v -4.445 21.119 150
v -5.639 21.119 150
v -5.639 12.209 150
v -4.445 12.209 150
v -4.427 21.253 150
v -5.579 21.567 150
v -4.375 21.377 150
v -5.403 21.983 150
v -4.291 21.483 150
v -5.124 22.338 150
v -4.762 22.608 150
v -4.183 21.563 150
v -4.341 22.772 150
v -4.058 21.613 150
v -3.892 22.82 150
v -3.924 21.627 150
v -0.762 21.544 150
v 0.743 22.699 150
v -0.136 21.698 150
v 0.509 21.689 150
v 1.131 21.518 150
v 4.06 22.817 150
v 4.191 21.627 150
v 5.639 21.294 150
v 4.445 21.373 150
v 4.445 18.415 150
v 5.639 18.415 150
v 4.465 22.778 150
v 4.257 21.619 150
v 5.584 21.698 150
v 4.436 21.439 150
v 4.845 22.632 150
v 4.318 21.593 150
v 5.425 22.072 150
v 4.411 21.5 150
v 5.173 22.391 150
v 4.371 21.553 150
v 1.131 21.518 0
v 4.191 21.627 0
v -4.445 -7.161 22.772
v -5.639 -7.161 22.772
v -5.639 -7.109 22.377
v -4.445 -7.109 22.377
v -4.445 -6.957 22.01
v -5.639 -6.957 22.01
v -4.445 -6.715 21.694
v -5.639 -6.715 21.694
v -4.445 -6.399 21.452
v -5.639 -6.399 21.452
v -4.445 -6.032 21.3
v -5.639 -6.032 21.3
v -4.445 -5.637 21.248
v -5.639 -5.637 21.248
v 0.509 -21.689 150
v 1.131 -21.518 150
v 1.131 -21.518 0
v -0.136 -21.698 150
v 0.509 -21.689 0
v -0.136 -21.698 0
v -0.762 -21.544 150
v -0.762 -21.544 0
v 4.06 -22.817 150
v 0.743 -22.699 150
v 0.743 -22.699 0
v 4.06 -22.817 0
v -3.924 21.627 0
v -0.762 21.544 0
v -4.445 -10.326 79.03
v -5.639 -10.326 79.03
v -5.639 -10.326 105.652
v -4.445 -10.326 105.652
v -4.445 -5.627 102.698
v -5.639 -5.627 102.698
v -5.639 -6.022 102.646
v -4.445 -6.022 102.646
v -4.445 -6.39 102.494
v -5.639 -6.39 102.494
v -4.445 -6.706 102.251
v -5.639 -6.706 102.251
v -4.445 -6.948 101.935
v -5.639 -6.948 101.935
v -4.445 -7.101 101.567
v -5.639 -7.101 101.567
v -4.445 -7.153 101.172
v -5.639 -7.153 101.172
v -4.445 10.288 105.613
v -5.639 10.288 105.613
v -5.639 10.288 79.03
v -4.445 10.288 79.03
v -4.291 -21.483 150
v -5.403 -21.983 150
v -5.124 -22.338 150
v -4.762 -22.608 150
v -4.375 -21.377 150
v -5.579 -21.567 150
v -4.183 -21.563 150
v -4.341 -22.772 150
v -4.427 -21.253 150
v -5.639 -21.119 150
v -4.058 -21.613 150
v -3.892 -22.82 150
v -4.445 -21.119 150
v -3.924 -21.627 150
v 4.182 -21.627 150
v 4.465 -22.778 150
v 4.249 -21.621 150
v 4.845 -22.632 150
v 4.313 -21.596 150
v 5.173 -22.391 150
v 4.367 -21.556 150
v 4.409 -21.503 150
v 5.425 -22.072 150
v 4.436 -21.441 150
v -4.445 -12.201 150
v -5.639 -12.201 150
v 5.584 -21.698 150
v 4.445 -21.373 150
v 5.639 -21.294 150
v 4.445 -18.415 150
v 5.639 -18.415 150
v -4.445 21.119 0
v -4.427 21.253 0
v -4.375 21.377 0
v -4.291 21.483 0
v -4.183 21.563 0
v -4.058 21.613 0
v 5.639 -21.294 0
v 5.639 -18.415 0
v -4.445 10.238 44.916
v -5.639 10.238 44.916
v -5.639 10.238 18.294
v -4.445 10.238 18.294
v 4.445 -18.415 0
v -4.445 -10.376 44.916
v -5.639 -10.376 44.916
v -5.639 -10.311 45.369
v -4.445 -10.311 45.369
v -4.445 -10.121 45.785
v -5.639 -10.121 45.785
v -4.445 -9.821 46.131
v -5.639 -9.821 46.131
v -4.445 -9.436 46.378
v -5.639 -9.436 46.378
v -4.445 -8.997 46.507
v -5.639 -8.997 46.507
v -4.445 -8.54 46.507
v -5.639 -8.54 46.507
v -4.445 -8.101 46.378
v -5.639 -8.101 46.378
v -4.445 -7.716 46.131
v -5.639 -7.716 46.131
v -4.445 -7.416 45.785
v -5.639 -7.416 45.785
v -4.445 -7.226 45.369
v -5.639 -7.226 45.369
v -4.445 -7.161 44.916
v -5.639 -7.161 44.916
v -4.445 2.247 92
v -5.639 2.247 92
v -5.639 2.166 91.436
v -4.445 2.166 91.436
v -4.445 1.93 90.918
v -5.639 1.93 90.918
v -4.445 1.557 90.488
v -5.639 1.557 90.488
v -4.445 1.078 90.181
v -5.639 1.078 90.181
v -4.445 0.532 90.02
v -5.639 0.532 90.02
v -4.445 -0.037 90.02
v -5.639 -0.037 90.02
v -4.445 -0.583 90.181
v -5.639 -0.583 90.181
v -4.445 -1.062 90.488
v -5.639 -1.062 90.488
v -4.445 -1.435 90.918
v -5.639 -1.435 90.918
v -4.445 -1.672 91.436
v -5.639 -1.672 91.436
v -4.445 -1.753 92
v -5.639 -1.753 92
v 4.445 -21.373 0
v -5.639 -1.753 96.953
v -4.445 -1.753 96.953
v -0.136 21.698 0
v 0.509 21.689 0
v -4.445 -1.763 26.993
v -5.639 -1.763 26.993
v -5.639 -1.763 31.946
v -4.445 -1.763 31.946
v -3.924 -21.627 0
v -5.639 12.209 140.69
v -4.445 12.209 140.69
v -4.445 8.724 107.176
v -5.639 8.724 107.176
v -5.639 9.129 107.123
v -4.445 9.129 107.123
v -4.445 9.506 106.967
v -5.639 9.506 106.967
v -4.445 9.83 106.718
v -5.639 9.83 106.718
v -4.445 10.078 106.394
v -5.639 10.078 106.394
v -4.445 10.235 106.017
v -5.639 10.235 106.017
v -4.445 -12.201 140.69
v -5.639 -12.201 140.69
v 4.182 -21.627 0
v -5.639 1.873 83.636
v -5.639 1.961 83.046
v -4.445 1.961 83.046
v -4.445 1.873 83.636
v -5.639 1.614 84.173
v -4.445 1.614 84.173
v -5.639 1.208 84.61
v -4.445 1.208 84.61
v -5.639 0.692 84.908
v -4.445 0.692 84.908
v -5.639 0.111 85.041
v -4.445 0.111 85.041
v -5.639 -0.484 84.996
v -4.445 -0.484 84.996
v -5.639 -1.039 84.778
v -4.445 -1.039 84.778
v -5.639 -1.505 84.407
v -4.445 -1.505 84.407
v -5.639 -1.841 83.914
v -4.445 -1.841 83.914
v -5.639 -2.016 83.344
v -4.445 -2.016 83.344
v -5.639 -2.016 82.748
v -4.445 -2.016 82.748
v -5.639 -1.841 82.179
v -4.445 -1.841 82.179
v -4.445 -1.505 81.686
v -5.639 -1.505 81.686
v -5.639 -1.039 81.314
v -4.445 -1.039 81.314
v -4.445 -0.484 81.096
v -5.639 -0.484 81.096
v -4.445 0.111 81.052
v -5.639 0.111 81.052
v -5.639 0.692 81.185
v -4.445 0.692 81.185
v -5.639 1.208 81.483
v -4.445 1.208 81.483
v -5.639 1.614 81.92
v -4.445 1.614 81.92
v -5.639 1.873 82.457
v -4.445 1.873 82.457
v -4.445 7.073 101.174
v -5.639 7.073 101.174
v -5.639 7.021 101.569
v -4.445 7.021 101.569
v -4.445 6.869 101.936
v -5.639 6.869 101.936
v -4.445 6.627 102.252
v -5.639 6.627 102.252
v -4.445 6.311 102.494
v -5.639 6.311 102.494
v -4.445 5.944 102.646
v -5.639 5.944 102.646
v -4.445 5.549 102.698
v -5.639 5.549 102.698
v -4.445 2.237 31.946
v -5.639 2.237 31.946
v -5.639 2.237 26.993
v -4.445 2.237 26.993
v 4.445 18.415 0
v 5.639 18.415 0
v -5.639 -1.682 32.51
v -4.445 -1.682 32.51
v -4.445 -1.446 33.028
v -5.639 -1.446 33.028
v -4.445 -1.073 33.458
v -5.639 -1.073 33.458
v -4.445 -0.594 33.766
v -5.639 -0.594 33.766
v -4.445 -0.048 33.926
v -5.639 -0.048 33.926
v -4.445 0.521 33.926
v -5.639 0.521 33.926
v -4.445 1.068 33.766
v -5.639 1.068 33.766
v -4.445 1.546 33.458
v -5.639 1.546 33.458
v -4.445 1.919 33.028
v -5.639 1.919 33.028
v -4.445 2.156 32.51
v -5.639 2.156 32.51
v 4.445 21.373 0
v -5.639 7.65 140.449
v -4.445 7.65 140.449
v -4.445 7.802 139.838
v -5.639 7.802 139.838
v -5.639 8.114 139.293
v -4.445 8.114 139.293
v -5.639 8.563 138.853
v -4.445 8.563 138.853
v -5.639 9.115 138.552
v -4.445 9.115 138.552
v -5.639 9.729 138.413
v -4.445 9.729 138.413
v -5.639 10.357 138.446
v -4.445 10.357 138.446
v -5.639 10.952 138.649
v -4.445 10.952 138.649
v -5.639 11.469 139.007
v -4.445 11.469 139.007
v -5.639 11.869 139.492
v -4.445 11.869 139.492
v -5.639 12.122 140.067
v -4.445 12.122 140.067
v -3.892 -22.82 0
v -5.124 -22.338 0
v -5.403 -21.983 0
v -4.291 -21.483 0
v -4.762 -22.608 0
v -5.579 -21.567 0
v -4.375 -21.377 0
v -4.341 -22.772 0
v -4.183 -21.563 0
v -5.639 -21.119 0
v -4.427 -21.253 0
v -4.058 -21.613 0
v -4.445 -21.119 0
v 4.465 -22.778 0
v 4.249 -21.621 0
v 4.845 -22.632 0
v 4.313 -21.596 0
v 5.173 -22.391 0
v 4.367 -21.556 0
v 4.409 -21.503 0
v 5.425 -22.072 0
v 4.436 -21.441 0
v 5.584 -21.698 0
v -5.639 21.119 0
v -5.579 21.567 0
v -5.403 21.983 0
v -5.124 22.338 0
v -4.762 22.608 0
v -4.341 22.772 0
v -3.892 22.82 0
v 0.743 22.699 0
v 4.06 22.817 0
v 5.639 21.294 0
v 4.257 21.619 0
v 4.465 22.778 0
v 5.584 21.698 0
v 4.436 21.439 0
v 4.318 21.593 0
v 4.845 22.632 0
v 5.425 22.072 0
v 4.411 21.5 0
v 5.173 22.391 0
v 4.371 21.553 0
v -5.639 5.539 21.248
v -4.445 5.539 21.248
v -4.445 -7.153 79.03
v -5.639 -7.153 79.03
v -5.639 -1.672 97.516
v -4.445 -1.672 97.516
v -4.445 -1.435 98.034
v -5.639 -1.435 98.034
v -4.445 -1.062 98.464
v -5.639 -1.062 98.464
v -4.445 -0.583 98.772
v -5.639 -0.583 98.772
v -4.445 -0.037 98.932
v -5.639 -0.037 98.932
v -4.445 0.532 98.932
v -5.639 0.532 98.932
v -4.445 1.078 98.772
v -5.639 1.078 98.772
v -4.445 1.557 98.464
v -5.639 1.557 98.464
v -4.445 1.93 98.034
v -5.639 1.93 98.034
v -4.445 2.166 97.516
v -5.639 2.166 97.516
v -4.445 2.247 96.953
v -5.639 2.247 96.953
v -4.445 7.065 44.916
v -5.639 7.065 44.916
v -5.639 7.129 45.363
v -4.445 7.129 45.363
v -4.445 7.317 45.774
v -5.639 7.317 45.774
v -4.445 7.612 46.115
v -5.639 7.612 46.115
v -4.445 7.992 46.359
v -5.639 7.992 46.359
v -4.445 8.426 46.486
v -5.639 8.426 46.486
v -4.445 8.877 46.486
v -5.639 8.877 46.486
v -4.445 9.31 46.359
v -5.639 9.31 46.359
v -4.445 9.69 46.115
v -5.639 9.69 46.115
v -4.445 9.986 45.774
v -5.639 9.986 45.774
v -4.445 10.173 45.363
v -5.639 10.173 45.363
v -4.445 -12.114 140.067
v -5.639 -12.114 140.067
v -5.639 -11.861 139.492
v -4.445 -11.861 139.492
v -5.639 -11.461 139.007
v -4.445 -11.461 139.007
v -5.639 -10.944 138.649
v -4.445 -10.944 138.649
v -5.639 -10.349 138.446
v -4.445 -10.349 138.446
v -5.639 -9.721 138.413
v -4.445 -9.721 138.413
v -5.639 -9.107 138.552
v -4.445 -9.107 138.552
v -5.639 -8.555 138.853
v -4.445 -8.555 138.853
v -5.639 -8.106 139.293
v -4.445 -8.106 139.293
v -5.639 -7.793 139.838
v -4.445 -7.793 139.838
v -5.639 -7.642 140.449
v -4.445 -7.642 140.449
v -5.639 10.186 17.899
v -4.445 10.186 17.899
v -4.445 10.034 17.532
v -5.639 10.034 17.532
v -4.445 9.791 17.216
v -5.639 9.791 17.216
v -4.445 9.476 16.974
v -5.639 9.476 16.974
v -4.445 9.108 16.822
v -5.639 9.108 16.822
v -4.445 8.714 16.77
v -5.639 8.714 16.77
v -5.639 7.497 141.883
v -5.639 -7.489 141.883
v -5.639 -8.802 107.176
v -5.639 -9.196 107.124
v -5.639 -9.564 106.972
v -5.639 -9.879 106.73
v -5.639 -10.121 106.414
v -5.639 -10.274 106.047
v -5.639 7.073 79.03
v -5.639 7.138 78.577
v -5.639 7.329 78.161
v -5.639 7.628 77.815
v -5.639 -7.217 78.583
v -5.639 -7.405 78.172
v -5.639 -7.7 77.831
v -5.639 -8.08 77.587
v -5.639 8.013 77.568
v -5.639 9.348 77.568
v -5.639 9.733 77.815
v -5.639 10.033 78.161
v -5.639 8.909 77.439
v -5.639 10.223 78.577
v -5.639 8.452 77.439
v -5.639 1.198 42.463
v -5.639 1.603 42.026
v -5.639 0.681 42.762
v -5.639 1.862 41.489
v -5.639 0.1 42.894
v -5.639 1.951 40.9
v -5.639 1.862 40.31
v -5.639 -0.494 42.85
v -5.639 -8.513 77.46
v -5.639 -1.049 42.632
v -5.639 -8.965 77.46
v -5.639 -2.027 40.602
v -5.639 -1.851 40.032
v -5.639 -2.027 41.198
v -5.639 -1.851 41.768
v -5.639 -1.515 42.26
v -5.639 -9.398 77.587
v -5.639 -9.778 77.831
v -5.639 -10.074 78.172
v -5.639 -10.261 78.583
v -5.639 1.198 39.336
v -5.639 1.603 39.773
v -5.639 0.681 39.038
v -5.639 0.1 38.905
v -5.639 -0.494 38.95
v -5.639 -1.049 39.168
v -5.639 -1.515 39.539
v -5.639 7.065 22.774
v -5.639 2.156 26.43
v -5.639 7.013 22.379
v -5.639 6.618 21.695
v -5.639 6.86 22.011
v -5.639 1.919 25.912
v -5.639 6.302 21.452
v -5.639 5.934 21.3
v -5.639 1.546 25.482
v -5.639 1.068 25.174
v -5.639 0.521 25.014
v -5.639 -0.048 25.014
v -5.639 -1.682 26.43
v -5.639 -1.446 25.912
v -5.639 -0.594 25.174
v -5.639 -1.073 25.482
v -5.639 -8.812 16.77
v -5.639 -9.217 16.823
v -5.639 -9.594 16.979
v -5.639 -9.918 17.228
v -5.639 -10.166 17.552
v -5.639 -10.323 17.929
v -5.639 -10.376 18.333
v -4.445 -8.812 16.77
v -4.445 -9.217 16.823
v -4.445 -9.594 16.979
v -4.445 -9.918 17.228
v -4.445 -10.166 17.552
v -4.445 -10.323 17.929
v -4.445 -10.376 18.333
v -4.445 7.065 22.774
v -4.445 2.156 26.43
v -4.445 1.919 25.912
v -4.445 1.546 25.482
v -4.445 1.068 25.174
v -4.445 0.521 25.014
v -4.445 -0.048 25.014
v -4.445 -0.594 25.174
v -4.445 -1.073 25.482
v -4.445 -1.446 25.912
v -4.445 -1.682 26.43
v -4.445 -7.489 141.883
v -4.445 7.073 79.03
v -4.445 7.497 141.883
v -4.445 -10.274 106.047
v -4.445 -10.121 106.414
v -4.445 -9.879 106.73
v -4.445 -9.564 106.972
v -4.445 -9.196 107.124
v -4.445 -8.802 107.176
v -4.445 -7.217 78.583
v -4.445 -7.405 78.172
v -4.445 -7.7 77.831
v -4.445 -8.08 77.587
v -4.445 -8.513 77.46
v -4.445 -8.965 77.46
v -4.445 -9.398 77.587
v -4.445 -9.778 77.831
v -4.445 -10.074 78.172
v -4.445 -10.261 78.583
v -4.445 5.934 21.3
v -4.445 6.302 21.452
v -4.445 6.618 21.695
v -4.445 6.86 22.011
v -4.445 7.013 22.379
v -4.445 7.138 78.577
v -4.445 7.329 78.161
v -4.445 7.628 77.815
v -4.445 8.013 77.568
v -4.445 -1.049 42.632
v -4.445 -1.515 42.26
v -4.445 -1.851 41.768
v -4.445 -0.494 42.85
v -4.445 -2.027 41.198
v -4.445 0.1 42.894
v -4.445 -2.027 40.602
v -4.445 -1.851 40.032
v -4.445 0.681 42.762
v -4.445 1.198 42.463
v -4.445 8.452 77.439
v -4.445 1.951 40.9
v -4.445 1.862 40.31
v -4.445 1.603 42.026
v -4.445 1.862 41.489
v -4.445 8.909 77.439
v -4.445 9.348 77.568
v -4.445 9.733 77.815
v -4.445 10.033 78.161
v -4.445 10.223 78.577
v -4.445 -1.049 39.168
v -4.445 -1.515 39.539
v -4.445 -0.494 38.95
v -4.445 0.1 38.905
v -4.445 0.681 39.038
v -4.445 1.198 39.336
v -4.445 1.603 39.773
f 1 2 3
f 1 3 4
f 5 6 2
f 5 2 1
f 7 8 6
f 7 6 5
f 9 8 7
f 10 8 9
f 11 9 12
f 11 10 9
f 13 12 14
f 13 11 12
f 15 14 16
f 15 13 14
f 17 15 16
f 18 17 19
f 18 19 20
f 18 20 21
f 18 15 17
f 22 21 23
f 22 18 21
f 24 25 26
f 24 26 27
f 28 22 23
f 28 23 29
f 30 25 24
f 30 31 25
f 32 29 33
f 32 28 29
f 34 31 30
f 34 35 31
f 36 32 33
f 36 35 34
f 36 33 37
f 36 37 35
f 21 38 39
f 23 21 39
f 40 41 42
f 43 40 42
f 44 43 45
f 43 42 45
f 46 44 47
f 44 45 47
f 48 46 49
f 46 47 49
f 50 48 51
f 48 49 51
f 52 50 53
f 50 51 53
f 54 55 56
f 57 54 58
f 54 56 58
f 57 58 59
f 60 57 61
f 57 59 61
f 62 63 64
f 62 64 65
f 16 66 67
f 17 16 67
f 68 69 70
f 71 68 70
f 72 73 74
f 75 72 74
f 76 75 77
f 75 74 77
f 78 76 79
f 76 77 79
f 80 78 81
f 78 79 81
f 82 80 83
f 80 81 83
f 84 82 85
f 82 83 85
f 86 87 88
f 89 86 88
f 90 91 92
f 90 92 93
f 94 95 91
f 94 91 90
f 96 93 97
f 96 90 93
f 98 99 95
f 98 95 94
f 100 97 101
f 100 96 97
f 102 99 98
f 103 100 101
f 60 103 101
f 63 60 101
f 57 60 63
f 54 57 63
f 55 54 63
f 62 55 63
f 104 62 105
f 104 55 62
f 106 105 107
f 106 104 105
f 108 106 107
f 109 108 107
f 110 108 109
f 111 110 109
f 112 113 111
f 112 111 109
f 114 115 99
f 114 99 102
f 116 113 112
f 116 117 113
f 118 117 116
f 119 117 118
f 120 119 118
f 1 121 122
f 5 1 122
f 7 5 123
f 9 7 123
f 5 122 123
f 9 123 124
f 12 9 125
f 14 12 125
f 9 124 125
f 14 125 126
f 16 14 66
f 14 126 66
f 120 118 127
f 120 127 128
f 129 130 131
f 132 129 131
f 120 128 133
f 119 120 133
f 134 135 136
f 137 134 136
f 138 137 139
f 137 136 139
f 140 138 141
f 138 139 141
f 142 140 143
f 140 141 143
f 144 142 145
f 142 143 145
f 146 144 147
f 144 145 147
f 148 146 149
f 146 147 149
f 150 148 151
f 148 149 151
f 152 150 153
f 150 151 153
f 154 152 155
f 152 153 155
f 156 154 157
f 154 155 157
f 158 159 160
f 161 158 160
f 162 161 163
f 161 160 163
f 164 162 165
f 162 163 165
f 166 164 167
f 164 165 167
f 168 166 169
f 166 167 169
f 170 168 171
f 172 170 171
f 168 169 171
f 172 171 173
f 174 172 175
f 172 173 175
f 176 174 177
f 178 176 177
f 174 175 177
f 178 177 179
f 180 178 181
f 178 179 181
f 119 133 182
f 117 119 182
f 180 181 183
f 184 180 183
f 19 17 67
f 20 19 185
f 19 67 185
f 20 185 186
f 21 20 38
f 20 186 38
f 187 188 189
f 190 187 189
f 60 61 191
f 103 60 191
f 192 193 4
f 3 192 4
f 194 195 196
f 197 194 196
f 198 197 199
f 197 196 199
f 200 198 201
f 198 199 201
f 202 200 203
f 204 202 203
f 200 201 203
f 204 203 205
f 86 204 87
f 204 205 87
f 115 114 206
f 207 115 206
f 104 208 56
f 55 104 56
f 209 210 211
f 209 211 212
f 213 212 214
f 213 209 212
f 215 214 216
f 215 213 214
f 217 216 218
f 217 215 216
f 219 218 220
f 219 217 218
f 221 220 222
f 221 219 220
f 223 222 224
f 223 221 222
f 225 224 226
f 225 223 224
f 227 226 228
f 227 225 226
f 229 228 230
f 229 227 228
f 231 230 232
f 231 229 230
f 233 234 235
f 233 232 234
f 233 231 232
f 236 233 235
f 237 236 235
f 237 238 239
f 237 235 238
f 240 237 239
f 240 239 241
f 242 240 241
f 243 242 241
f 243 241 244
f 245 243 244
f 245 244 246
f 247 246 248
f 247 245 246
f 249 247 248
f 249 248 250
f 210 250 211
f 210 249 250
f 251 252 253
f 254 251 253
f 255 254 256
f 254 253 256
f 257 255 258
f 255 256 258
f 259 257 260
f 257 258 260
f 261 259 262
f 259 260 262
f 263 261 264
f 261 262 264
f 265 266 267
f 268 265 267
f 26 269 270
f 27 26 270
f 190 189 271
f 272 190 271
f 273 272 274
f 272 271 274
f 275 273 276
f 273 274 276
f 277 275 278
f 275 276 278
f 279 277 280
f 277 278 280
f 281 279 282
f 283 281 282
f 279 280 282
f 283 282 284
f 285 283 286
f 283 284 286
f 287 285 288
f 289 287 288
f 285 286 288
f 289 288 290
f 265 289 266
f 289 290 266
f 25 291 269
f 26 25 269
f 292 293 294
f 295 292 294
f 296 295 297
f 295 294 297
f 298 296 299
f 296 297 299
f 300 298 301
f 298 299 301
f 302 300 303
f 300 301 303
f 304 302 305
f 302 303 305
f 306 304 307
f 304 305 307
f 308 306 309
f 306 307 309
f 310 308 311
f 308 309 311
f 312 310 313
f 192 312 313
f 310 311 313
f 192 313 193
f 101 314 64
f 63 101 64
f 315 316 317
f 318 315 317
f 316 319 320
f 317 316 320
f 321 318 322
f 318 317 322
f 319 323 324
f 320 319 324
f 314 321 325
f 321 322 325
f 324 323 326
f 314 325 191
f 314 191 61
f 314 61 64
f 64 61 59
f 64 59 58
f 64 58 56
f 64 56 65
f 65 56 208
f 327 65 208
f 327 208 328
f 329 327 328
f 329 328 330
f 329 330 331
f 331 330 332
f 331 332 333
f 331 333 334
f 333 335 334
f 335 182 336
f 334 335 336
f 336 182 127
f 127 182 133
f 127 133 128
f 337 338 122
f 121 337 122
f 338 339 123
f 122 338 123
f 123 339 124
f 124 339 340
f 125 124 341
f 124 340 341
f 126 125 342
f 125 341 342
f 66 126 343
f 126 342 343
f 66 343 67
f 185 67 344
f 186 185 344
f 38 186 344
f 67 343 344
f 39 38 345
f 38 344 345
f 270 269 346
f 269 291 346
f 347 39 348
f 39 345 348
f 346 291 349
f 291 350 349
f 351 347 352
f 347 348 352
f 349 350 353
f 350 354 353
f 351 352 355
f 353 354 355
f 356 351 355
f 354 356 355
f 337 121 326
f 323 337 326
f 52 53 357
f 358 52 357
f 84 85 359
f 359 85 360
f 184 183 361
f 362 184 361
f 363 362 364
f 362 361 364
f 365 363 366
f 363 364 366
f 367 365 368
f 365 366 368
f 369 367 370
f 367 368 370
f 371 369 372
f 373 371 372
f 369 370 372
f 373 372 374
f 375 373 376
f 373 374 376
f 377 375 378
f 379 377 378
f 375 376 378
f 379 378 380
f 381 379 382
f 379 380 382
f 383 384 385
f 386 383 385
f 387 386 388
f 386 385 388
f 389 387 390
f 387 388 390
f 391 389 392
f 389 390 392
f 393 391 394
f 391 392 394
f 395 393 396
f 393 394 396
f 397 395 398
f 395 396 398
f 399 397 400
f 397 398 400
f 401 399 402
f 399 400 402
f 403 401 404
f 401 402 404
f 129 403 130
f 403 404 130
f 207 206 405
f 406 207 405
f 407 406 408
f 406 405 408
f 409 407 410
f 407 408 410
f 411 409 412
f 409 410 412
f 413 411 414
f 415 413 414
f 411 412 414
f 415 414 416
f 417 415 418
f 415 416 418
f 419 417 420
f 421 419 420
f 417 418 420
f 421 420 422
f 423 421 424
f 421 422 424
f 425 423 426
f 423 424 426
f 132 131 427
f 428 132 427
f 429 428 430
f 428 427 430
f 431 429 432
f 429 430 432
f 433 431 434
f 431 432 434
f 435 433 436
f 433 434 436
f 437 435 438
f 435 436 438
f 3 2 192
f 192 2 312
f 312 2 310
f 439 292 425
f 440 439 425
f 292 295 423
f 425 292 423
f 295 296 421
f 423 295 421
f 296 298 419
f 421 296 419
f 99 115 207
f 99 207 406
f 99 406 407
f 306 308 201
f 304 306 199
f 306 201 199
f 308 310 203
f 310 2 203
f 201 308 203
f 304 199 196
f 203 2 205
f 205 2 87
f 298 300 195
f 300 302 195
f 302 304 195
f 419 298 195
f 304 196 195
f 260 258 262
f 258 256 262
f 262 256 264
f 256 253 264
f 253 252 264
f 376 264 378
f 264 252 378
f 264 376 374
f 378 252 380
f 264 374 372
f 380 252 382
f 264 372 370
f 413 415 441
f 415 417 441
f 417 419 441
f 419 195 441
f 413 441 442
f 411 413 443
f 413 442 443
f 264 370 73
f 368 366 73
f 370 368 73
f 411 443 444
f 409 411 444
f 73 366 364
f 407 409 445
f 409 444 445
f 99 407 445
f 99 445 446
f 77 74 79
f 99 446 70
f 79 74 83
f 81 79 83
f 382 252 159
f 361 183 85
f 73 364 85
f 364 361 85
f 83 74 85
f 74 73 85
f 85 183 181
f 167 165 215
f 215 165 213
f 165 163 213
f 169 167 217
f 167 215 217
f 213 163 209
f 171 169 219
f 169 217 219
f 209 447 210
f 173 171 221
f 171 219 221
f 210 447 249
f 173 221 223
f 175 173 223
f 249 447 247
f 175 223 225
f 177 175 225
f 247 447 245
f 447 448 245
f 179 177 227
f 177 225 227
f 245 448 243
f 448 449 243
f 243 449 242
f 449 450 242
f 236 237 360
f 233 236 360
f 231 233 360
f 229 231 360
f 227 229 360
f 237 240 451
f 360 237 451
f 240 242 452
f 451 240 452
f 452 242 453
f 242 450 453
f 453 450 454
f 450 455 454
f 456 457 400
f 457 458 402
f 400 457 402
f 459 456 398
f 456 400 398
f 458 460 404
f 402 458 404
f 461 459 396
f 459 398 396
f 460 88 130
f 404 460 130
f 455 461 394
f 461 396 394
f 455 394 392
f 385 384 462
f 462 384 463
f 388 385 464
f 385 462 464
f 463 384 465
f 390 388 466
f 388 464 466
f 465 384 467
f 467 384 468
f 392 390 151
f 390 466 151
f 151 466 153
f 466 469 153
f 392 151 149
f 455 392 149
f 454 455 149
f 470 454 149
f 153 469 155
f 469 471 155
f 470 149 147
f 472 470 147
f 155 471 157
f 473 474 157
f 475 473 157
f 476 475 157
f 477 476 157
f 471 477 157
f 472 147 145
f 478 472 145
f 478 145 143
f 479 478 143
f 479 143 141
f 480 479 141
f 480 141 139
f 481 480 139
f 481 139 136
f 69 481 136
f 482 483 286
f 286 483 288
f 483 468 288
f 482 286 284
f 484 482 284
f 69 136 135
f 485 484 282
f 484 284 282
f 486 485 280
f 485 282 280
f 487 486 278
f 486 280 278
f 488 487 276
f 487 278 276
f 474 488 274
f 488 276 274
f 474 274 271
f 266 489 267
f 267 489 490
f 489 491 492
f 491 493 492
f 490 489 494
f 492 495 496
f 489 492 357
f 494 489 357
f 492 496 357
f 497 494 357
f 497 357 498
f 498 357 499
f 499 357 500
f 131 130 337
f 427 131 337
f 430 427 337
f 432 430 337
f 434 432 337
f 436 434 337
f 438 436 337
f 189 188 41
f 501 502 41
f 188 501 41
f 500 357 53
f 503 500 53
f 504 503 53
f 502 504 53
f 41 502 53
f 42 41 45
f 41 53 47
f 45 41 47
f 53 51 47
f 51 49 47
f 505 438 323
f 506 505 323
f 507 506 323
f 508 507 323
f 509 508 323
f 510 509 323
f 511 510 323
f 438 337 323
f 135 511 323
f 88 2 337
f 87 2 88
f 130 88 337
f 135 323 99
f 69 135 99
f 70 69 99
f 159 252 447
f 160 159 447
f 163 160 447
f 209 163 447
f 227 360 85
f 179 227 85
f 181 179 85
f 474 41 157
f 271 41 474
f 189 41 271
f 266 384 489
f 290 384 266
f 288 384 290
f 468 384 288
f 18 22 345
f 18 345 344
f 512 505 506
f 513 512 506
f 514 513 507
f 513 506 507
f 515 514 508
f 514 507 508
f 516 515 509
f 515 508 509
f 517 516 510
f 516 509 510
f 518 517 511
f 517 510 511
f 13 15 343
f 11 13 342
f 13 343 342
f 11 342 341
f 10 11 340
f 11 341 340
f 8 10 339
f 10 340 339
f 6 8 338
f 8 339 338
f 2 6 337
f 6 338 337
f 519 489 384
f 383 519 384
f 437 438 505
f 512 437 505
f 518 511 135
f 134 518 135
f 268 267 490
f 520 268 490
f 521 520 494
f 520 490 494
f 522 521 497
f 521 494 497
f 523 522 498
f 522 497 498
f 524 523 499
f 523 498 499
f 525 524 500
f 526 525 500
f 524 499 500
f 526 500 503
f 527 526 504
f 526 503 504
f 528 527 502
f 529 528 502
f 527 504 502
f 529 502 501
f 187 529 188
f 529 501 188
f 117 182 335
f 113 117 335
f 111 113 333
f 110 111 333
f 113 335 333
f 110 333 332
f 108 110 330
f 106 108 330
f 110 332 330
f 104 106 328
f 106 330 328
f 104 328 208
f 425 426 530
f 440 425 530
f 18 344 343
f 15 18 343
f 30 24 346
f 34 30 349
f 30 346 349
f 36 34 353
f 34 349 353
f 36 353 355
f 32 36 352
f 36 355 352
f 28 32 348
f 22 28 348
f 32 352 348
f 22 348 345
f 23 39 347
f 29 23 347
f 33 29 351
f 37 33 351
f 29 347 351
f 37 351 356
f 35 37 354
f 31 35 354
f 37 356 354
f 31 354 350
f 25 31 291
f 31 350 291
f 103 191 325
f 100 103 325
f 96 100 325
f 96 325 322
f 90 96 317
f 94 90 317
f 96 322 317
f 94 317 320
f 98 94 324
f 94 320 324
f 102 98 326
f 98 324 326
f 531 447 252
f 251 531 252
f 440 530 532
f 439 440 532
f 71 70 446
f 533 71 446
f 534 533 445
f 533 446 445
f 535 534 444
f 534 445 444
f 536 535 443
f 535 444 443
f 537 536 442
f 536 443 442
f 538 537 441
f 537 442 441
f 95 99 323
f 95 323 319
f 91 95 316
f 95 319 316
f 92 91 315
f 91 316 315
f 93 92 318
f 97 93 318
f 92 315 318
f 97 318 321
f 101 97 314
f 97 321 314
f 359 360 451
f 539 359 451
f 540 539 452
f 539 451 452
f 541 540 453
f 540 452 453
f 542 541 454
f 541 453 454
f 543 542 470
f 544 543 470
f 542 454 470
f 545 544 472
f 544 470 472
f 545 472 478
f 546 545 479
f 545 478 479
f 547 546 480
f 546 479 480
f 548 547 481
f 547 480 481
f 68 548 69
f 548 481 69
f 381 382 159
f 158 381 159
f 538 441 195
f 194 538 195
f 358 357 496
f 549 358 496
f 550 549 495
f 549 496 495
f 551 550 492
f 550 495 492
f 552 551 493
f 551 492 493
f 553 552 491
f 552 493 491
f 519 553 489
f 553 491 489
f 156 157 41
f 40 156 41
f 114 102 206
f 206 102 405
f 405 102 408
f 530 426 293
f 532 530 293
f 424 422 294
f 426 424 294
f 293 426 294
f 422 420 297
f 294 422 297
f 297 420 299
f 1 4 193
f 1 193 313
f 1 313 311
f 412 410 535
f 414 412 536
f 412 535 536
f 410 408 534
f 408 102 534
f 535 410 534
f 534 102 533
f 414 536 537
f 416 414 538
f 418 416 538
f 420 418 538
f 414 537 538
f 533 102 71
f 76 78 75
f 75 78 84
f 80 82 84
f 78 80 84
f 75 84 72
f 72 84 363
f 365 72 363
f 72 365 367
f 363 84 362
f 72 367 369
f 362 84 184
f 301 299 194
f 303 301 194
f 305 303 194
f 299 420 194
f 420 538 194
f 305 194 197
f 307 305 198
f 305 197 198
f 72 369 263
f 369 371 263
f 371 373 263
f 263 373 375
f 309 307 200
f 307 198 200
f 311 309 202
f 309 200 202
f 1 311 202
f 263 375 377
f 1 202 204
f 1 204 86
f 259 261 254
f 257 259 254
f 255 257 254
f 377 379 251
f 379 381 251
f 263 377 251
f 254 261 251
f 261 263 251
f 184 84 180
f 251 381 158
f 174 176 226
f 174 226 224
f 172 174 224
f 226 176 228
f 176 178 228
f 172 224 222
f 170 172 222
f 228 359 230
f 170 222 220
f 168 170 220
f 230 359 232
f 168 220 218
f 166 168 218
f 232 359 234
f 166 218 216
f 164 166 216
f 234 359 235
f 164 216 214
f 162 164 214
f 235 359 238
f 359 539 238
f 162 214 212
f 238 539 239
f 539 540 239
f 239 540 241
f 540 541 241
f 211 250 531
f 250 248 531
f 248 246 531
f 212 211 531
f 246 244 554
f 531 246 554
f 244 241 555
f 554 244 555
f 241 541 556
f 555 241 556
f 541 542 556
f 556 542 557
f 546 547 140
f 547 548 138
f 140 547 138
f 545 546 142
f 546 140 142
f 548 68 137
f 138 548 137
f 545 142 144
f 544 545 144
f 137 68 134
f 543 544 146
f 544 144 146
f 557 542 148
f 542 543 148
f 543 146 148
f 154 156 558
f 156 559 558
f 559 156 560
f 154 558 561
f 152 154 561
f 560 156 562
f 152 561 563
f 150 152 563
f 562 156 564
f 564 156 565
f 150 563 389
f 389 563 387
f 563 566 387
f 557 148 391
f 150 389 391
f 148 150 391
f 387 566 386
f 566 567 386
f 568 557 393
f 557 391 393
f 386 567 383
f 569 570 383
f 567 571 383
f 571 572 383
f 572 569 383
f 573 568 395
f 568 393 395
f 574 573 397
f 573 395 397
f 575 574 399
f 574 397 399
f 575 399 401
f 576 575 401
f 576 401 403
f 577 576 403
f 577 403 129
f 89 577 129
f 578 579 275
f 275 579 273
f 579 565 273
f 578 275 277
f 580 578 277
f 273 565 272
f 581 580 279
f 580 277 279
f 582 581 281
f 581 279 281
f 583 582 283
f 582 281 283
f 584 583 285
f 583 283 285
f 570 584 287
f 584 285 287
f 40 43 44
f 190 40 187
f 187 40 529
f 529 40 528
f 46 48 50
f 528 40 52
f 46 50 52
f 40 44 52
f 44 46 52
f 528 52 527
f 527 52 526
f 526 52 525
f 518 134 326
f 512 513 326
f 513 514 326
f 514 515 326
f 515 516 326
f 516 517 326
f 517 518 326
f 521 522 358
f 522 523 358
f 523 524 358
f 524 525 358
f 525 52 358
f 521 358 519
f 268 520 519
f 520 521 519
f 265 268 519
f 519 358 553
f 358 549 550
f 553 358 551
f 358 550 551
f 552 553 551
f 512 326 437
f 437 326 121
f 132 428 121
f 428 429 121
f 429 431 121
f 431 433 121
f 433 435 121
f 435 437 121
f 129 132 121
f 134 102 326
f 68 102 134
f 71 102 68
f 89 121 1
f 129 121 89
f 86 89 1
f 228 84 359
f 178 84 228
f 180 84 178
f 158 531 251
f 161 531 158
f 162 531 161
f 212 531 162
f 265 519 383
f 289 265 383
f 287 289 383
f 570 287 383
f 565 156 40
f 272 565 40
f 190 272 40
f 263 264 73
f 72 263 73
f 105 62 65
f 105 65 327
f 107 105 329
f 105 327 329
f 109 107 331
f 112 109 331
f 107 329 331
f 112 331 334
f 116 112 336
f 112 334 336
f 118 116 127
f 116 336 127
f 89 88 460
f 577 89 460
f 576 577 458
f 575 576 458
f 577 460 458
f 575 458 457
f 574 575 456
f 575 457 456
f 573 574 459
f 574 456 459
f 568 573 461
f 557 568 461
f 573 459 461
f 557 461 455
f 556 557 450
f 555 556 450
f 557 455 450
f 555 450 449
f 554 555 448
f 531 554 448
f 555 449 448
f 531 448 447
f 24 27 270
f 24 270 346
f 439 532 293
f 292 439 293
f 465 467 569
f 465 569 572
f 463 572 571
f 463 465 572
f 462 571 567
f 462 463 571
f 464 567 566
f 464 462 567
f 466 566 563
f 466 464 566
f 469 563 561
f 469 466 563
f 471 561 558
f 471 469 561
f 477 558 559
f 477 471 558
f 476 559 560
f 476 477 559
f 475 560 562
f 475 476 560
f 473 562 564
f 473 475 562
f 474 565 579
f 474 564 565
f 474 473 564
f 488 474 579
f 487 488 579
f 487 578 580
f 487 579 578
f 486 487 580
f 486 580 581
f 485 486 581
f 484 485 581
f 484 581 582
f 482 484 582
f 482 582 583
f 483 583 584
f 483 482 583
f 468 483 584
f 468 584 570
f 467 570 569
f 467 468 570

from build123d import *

# Parameters (mm, degrees)
BOSS_EXTRUDE1_DEPTH     = 150
CUT_EXTRUDE5_DEPTH      = 153.060765161
CUT_EXTRUDE6_DEPTH      = 153.060765161
CUT_EXTRUDE6_DEPTH_BACK = 153.060765161
SKETCH3_R               = 2
CUT_EXTRUDE7_DEPTH      = 153.060765161
CUT_EXTRUDE7_DEPTH_BACK = 153.060765161
SKETCH6_R               = 2


with BuildPart() as part:
    # Sketch1 → Boss-Extrude1 (new body)
    with BuildSketch(Plane.XY):
        with BuildLine():
            Line((4.445, 18.415), (5.6388, 18.415))
            Line((5.6388, 18.415), (5.6388, 21.294464083))
            ThreePointArc((5.6388, 21.294464083), (5.173007463, 22.391174147), (4.060357789, 22.817491346))
            Line((4.060357789, 22.817491346), (0.743323143, 22.698920454))
            Line((0.743323143, 22.698920454), (-3.892452069, 22.8203125))
            ThreePointArc((-3.892452069, 22.8203125), (-5.124499805, 22.338098312), (-5.6388, 21.119095664))
            Line((-5.6388, 21.119095664), (-5.6388, -21.119095664))
            ThreePointArc((-5.6388, -21.119095664), (-5.124499805, -22.338098312), (-3.892452069, -22.8203125))
            Line((-3.892452069, -22.8203125), (0.743323143, -22.698920454))
            Line((0.743323143, -22.698920454), (4.060357789, -22.817491346))
            ThreePointArc((4.060357789, -22.817491346), (5.173007463, -22.391174147), (5.6388, -21.294464083))
            Line((5.6388, -21.294464083), (5.6388, -18.415))
            Line((5.6388, -18.415), (4.445, -18.415))
            Line((4.445, -18.415), (4.445, -21.3734366))
            ThreePointArc((4.445, -21.3734366), (4.367367911, -21.55622161), (4.181926298, -21.627274477))
            Line((4.181926298, -21.627274477), (1.131158407, -21.51822157))
            ThreePointArc((1.131158407, -21.51822157), (0.187154328, -21.71413397), (-0.761857041, -21.544125758))
            Line((-0.761857041, -21.544125758), (-3.92370211, -21.626921585))
            ThreePointArc((-3.92370211, -21.626921585), (-4.291477554, -21.482977052), (-4.445, -21.119095664))
            Line((-4.445, -21.119095664), (-4.445, 21.119095664))
            ThreePointArc((-4.445, 21.119095664), (-4.291477554, 21.482977052), (-3.92370211, 21.626921585))
            Line((-3.92370211, 21.626921585), (-0.761857041, 21.544125758))
            ThreePointArc((-0.761857041, 21.544125758), (0.187154328, 21.71413397), (1.131158407, 21.51822157))
            Line((1.131158407, 21.51822157), (4.191, 21.6274366))
            ThreePointArc((4.191, 21.6274366), (4.370605122, 21.553041722), (4.445, 21.3734366))
            Line((4.445, 21.3734366), (4.445, 18.415))
        make_face()
    extrude(amount=BOSS_EXTRUDE1_DEPTH)

    # Sketch2 → Cut-Extrude5 (cut, through all)
    with BuildSketch(Plane(origin=(-4.445, 0, 0), x_dir=(0, 0, -1), z_dir=(1, 0, 0))):
        with BuildLine():
            Line((-150.086983229, 12.208813289), (-150.086983229, -12.200691478))
            Line((-150.086983229, -12.200691478), (-140.690340072, -12.200691478))
            ThreePointArc((-140.690340072, -12.200691478), (-138.407548952, -10.035772864), (-140.448517226, -7.641517989))
            Line((-140.448517226, -7.641517989), (-141.882783229, -7.4889391))
            Line((-141.882783229, -7.4889391), (-141.882783229, 7.497060911))
            Line((-141.882783229, 7.497060911), (-140.448517226, 7.6496398))
            ThreePointArc((-140.448517226, 7.6496398), (-138.407548952, 10.043894675), (-140.690340072, 12.208813289))
            Line((-140.690340072, 12.208813289), (-150.086983229, 12.208813289))
        make_face()
    extrude(amount=-CUT_EXTRUDE5_DEPTH, mode=Mode.SUBTRACT)

    # Sketch3 → Cut-Extrude6 (cut, two sides: drawn at the far end of the back side and taken through both)
    with BuildSketch(Plane(origin=(-4.445, 0, 0), x_dir=(0, 0, -1), z_dir=(1, 0, 0)).offset(-CUT_EXTRUDE6_DEPTH_BACK)):
        with Locations(Location((-83.046273188, -0.038624064, 0), (0, 0, 90))):
            Circle(SKETCH3_R)
        with BuildLine():
            Line((-105.612723982, 10.28792521), (-79.030103641, 10.28792521))
            ThreePointArc((-79.030103641, 10.28792521), (-77.422829038, 8.680650607), (-79.030103641, 7.073376004))
            Line((-79.030103641, 7.073376004), (-101.174207902, 7.073376004))
            ThreePointArc((-101.174207902, 7.073376004), (-102.251838636, 6.627006739), (-102.698207902, 5.549376004))
            Line((-102.698207902, 5.549376004), (-102.698207902, -5.626624133))
            ThreePointArc((-102.698207902, -5.626624133), (-102.251199404, -6.70579811), (-101.172025428, -7.152806607))
            Line((-101.172025428, -7.152806607), (-79.030103641, -7.152806607))
            ThreePointArc((-79.030103641, -7.152806607), (-77.443694877, -8.73921537), (-79.030103641, -10.325624133))
            Line((-79.030103641, -10.325624133), (-105.652273188, -10.325624133))
            ThreePointArc((-105.652273188, -10.325624133), (-106.729903922, -9.879254868), (-107.176273188, -8.801624133))
            Line((-107.176273188, -8.801624133), (-107.176273188, 8.724376004))
            ThreePointArc((-107.176273188, 8.724376004), (-106.718320228, 9.82997225), (-105.612723982, 10.28792521))
        make_face()
        with BuildLine():
            Line((-96.952773188, 2.247375936), (-91.999773188, 2.247375936))
            ThreePointArc((-91.999773188, 2.247375936), (-89.999773188, 0.247375936), (-91.999773188, -1.752624064))
            Line((-91.999773188, -1.752624064), (-96.952773188, -1.752624064))
            ThreePointArc((-96.952773188, -1.752624064), (-98.952773188, 0.247375936), (-96.952773188, 2.247375936))
        make_face()
    extrude(amount=CUT_EXTRUDE6_DEPTH + CUT_EXTRUDE6_DEPTH_BACK, mode=Mode.SUBTRACT)

    # Sketch6 → Cut-Extrude7 (cut, two sides: drawn at the far end of the back side and taken through both)
    with BuildSketch(Plane(origin=(-4.445, 0, 0), x_dir=(0, 0, -1), z_dir=(1, 0, 0)).offset(-CUT_EXTRUDE7_DEPTH_BACK)):
        with Locations(Location((-40.899819498, -0.049300509, 0), (0, 0, 90))):
            Circle(SKETCH6_R)
        with BuildLine():
            Line((-18.333368704, -10.375849783), (-44.915989045, -10.375849783))
            ThreePointArc((-44.915989045, -10.375849783), (-46.523263648, -8.76857518), (-44.915989045, -7.161300577))
            Line((-44.915989045, -7.161300577), (-22.771884784, -7.161300577))
            ThreePointArc((-22.771884784, -7.161300577), (-21.694254049, -6.714931312), (-21.247884784, -5.637300577))
            Line((-21.247884784, -5.637300577), (-21.247884784, 5.53869956))
            ThreePointArc((-21.247884784, 5.53869956), (-21.694893281, 6.617873536), (-22.774067257, 7.064882034))
            Line((-22.774067257, 7.064882034), (-44.915989045, 7.064882034))
            ThreePointArc((-44.915989045, 7.064882034), (-46.502397808, 8.651290797), (-44.915989045, 10.23769956))
            Line((-44.915989045, 10.23769956), (-18.293819498, 10.23769956))
            ThreePointArc((-18.293819498, 10.23769956), (-17.216188763, 9.791330295), (-16.769819498, 8.71369956))
            Line((-16.769819498, 8.71369956), (-16.769819498, -8.812300577))
            ThreePointArc((-16.769819498, -8.812300577), (-17.227772458, -9.917896824), (-18.333368704, -10.375849783))
        make_face()
        with BuildLine():
            Line((-26.993319498, -1.763300509), (-31.946319498, -1.763300509))
            ThreePointArc((-31.946319498, -1.763300509), (-33.946319498, 0.236699491), (-31.946319498, 2.236699491))
            Line((-31.946319498, 2.236699491), (-26.993319498, 2.236699491))
            ThreePointArc((-26.993319498, 2.236699491), (-24.993319498, 0.236699491), (-26.993319498, -1.763300509))
        make_face()
    extrude(amount=CUT_EXTRUDE7_DEPTH + CUT_EXTRUDE7_DEPTH_BACK, mode=Mode.SUBTRACT)


solid = part.part
